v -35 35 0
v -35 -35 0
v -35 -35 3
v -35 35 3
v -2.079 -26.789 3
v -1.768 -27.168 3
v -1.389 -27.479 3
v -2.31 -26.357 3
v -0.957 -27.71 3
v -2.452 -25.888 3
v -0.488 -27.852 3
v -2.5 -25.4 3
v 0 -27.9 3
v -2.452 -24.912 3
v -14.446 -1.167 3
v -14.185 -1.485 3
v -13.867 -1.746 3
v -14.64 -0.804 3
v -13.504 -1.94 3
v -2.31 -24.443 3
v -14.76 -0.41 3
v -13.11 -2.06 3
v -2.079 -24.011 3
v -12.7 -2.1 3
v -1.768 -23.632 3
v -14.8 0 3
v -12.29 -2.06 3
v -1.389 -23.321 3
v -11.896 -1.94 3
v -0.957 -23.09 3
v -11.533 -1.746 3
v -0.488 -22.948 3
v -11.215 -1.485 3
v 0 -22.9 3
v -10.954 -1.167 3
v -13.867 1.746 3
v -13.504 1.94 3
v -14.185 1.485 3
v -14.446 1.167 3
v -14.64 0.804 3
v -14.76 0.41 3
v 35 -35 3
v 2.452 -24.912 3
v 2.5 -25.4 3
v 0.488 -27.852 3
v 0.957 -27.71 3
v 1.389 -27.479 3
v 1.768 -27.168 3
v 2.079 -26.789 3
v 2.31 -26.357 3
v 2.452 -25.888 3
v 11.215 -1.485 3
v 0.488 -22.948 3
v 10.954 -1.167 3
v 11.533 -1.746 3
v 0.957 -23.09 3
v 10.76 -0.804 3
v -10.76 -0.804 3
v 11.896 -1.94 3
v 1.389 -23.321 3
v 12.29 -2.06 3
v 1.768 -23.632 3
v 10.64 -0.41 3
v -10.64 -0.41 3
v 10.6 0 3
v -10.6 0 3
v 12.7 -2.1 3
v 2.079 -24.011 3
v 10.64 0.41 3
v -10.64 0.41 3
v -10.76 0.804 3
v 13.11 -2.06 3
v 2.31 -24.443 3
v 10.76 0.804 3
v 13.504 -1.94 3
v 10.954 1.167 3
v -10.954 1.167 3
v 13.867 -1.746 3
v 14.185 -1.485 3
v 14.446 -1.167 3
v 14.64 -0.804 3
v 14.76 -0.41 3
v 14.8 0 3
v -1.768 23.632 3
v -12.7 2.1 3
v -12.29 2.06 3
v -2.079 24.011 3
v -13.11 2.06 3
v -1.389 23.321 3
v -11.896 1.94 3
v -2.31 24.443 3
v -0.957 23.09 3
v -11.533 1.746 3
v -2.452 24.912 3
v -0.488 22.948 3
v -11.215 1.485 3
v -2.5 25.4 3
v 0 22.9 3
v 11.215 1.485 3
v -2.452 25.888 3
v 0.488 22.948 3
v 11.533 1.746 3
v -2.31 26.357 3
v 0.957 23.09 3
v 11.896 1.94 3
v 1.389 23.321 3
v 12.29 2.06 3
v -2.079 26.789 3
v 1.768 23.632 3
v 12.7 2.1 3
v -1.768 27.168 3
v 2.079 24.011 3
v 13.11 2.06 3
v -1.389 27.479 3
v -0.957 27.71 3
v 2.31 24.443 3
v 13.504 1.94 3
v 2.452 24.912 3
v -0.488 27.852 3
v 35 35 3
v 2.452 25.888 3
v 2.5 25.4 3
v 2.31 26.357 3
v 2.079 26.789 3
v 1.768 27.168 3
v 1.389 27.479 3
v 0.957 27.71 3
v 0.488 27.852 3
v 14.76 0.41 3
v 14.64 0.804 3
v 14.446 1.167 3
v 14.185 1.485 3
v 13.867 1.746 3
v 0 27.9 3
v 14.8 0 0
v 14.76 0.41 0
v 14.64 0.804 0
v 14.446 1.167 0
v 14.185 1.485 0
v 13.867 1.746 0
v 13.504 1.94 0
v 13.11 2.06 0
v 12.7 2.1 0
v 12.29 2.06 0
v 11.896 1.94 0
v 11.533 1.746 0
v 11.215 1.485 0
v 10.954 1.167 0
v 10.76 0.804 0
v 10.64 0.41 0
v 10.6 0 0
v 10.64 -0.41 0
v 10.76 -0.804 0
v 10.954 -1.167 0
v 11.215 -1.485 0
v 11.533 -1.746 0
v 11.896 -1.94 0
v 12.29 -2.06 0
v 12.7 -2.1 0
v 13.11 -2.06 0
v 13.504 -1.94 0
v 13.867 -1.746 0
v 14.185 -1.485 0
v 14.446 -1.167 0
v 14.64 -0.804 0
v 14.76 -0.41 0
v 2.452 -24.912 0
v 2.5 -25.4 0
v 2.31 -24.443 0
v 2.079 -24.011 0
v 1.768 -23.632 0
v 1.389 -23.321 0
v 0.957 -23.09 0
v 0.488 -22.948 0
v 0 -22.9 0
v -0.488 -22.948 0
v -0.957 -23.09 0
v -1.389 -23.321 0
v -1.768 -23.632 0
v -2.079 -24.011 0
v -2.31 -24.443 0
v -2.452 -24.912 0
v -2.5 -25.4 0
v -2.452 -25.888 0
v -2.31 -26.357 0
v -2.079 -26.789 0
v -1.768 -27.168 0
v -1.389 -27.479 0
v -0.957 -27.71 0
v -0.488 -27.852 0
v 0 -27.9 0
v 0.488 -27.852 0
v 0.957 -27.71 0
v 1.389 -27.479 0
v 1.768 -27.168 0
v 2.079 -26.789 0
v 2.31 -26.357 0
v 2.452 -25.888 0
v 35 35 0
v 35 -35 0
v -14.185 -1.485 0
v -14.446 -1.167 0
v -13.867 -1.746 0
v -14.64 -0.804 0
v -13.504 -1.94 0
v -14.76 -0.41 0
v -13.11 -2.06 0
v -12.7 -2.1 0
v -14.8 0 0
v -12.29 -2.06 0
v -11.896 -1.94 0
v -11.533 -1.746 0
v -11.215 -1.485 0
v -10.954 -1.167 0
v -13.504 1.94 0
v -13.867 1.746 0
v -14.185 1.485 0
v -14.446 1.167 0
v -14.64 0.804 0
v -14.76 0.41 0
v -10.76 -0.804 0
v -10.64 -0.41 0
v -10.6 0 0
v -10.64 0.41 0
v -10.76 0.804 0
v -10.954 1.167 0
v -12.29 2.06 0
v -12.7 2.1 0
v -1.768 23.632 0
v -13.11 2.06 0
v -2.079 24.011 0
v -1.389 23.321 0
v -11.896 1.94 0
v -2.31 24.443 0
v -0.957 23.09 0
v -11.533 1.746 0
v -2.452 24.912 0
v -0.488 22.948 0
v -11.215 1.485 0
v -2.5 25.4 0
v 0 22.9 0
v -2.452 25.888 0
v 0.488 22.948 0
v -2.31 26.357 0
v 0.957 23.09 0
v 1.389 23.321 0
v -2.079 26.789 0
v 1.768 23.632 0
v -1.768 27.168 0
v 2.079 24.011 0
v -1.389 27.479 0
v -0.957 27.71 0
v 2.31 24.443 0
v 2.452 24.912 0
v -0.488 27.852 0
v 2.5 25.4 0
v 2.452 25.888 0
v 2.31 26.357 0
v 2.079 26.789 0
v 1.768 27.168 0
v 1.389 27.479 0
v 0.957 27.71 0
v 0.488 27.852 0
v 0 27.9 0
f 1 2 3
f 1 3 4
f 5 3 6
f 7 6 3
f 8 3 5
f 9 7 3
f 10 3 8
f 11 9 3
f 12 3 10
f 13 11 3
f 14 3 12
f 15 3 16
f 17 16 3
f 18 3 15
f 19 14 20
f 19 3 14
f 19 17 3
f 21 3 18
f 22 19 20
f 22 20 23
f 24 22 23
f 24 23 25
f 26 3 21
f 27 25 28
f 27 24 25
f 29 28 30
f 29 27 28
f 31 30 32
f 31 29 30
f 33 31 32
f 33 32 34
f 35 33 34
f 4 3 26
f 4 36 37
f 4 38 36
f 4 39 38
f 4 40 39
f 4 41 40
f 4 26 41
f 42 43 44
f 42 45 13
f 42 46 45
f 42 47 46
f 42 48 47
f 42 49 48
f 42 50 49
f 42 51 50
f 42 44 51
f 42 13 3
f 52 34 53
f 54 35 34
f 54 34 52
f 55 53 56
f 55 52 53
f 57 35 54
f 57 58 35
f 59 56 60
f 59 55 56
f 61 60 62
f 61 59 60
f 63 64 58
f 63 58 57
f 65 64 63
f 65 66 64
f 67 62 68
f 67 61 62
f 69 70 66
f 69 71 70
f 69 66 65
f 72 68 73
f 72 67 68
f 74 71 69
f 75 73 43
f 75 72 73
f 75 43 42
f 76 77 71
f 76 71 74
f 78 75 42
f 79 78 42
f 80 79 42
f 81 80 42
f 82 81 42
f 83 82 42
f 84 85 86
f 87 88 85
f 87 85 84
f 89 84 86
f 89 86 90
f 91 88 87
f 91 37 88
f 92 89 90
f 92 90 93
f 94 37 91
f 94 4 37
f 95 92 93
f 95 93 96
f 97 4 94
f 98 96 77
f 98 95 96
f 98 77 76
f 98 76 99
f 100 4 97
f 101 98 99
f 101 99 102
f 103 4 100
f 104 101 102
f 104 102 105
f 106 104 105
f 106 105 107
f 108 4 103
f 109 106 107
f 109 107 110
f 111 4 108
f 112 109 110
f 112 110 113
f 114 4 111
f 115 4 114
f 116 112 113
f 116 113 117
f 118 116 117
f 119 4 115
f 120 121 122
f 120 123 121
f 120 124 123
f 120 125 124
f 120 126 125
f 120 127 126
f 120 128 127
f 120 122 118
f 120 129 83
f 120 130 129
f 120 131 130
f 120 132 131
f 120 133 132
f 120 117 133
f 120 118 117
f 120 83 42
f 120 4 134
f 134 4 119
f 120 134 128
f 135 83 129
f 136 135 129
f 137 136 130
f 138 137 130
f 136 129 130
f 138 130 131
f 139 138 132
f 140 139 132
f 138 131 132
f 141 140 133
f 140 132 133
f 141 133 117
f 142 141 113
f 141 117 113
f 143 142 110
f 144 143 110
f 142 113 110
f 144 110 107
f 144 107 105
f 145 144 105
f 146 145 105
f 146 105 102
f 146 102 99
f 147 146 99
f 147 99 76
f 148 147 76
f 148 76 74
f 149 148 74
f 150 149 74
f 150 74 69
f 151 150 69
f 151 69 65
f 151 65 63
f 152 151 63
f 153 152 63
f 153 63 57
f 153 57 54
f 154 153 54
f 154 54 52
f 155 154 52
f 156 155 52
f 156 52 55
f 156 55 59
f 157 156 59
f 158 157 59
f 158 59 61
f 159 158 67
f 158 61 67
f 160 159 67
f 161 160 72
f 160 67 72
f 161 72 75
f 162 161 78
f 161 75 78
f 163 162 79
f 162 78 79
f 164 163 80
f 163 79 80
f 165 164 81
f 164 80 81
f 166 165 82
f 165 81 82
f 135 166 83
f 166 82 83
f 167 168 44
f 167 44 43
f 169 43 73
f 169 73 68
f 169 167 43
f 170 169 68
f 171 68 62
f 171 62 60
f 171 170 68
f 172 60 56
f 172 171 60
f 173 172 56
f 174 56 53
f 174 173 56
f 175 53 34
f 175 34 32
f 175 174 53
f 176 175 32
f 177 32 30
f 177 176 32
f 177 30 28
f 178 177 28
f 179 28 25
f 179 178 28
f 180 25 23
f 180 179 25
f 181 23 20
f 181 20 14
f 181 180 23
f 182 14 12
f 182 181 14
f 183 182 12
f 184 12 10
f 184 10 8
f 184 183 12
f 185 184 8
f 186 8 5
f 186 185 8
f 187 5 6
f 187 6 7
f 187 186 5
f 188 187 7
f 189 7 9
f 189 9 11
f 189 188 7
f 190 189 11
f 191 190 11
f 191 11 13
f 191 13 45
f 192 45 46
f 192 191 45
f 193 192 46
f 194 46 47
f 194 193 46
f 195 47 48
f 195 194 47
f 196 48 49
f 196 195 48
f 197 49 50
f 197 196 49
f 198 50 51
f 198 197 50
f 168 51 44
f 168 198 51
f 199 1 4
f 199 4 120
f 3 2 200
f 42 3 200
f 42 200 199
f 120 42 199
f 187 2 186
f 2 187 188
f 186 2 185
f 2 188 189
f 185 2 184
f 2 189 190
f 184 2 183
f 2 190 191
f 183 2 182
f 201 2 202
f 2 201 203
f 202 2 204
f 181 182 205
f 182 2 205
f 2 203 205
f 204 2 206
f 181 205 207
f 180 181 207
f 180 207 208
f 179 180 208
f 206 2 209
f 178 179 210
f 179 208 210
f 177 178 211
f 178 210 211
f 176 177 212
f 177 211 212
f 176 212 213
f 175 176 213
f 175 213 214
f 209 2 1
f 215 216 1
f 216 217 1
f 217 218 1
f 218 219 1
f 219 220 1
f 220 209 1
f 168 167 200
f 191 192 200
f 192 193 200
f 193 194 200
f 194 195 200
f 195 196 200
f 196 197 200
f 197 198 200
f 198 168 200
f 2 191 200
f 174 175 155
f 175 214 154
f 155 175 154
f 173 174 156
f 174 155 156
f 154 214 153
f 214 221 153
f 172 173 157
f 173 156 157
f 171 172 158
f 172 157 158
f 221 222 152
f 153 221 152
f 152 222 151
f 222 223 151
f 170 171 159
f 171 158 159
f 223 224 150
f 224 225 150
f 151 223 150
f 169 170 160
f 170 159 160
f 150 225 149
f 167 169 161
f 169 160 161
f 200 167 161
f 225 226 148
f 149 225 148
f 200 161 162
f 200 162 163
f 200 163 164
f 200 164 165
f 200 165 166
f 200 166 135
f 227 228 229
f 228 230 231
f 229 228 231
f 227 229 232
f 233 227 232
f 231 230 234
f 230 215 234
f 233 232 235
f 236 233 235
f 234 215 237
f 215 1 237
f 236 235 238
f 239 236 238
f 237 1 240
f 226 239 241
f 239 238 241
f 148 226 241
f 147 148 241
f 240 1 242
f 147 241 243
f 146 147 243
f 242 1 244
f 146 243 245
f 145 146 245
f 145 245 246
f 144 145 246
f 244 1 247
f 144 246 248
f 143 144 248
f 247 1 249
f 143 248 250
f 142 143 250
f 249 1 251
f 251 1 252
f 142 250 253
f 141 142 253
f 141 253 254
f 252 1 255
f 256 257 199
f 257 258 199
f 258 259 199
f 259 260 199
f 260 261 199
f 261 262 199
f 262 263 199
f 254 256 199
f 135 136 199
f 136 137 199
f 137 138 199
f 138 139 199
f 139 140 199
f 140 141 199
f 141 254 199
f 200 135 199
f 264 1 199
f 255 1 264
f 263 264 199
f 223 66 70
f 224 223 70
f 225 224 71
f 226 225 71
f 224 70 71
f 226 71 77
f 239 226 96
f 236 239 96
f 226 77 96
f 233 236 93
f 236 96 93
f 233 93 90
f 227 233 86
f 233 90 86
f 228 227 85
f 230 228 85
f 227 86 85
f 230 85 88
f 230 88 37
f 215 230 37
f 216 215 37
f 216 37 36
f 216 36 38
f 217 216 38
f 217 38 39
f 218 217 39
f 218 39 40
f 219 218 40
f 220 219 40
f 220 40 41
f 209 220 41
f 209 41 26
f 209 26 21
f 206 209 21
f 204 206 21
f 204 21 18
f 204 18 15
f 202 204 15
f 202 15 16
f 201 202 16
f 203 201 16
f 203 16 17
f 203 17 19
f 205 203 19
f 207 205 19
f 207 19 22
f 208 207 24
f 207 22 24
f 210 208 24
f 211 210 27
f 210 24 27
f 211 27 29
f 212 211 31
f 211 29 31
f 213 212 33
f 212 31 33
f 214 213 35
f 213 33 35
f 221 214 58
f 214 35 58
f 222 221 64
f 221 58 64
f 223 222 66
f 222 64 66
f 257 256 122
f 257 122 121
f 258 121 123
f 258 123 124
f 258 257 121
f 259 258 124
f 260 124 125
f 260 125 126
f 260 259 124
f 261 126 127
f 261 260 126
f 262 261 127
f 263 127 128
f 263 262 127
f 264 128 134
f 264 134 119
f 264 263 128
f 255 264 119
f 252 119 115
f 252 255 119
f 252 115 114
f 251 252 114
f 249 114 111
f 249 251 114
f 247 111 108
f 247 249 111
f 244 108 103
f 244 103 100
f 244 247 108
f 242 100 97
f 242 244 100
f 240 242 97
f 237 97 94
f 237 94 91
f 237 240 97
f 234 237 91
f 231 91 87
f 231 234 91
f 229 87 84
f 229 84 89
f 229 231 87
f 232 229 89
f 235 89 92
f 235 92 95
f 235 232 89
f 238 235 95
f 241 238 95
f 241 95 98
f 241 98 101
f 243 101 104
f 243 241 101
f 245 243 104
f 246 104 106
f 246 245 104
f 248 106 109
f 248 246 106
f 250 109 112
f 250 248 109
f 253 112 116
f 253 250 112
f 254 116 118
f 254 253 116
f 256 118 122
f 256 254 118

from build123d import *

# Parameters (mm, degrees)
CROQUIS1_W              = 70
CROQUIS1_H              = 70
CROQUIS1_R              = 2.5
SALIENTE_EXTRUIR1_DEPTH = 3
CORTAR_EXTRUIR1_REACH   = 5
CROQUIS2_R              = 2.1


with BuildPart() as part:
    # Croquis1 → Saliente-Extruir1 (new body)
    with BuildSketch(Plane.XY):
        Rectangle(CROQUIS1_W, CROQUIS1_H)
        with Locations((0, 25.4)):
            Circle(CROQUIS1_R, mode=Mode.SUBTRACT)
        with Locations((0, -25.4)):
            Circle(CROQUIS1_R, mode=Mode.SUBTRACT)
    extrude(amount=SALIENTE_EXTRUIR1_DEPTH)

    # Croquis2 → Cortar-Extruir1 (cut, up to next)
    with BuildSketch(Plane.XY.offset(3), mode=Mode.PRIVATE) as cortar_extruir1_sk1:
        with Locations((-12.7, 0)):
            Circle(CROQUIS2_R)
    cortar_extruir1_tool1 = extrude(cortar_extruir1_sk1.sketch, amount=-CORTAR_EXTRUIR1_REACH, mode=Mode.PRIVATE) & part.part
    add(cortar_extruir1_tool1.solids().sort_by_distance((-12.7, 0, 3))[0], mode=Mode.SUBTRACT)
    # Croquis2 → Cortar-Extruir1 (cut, up to next)
    with BuildSketch(Plane.XY.offset(3), mode=Mode.PRIVATE) as cortar_extruir1_sk2:
        with Locations((12.7, 0)):
            Circle(CROQUIS2_R)
    cortar_extruir1_tool2 = extrude(cortar_extruir1_sk2.sketch, amount=-CORTAR_EXTRUIR1_REACH, mode=Mode.PRIVATE) & part.part
    add(cortar_extruir1_tool2.solids().sort_by_distance((12.7, 0, 3))[0], mode=Mode.SUBTRACT)


solid = part.part
